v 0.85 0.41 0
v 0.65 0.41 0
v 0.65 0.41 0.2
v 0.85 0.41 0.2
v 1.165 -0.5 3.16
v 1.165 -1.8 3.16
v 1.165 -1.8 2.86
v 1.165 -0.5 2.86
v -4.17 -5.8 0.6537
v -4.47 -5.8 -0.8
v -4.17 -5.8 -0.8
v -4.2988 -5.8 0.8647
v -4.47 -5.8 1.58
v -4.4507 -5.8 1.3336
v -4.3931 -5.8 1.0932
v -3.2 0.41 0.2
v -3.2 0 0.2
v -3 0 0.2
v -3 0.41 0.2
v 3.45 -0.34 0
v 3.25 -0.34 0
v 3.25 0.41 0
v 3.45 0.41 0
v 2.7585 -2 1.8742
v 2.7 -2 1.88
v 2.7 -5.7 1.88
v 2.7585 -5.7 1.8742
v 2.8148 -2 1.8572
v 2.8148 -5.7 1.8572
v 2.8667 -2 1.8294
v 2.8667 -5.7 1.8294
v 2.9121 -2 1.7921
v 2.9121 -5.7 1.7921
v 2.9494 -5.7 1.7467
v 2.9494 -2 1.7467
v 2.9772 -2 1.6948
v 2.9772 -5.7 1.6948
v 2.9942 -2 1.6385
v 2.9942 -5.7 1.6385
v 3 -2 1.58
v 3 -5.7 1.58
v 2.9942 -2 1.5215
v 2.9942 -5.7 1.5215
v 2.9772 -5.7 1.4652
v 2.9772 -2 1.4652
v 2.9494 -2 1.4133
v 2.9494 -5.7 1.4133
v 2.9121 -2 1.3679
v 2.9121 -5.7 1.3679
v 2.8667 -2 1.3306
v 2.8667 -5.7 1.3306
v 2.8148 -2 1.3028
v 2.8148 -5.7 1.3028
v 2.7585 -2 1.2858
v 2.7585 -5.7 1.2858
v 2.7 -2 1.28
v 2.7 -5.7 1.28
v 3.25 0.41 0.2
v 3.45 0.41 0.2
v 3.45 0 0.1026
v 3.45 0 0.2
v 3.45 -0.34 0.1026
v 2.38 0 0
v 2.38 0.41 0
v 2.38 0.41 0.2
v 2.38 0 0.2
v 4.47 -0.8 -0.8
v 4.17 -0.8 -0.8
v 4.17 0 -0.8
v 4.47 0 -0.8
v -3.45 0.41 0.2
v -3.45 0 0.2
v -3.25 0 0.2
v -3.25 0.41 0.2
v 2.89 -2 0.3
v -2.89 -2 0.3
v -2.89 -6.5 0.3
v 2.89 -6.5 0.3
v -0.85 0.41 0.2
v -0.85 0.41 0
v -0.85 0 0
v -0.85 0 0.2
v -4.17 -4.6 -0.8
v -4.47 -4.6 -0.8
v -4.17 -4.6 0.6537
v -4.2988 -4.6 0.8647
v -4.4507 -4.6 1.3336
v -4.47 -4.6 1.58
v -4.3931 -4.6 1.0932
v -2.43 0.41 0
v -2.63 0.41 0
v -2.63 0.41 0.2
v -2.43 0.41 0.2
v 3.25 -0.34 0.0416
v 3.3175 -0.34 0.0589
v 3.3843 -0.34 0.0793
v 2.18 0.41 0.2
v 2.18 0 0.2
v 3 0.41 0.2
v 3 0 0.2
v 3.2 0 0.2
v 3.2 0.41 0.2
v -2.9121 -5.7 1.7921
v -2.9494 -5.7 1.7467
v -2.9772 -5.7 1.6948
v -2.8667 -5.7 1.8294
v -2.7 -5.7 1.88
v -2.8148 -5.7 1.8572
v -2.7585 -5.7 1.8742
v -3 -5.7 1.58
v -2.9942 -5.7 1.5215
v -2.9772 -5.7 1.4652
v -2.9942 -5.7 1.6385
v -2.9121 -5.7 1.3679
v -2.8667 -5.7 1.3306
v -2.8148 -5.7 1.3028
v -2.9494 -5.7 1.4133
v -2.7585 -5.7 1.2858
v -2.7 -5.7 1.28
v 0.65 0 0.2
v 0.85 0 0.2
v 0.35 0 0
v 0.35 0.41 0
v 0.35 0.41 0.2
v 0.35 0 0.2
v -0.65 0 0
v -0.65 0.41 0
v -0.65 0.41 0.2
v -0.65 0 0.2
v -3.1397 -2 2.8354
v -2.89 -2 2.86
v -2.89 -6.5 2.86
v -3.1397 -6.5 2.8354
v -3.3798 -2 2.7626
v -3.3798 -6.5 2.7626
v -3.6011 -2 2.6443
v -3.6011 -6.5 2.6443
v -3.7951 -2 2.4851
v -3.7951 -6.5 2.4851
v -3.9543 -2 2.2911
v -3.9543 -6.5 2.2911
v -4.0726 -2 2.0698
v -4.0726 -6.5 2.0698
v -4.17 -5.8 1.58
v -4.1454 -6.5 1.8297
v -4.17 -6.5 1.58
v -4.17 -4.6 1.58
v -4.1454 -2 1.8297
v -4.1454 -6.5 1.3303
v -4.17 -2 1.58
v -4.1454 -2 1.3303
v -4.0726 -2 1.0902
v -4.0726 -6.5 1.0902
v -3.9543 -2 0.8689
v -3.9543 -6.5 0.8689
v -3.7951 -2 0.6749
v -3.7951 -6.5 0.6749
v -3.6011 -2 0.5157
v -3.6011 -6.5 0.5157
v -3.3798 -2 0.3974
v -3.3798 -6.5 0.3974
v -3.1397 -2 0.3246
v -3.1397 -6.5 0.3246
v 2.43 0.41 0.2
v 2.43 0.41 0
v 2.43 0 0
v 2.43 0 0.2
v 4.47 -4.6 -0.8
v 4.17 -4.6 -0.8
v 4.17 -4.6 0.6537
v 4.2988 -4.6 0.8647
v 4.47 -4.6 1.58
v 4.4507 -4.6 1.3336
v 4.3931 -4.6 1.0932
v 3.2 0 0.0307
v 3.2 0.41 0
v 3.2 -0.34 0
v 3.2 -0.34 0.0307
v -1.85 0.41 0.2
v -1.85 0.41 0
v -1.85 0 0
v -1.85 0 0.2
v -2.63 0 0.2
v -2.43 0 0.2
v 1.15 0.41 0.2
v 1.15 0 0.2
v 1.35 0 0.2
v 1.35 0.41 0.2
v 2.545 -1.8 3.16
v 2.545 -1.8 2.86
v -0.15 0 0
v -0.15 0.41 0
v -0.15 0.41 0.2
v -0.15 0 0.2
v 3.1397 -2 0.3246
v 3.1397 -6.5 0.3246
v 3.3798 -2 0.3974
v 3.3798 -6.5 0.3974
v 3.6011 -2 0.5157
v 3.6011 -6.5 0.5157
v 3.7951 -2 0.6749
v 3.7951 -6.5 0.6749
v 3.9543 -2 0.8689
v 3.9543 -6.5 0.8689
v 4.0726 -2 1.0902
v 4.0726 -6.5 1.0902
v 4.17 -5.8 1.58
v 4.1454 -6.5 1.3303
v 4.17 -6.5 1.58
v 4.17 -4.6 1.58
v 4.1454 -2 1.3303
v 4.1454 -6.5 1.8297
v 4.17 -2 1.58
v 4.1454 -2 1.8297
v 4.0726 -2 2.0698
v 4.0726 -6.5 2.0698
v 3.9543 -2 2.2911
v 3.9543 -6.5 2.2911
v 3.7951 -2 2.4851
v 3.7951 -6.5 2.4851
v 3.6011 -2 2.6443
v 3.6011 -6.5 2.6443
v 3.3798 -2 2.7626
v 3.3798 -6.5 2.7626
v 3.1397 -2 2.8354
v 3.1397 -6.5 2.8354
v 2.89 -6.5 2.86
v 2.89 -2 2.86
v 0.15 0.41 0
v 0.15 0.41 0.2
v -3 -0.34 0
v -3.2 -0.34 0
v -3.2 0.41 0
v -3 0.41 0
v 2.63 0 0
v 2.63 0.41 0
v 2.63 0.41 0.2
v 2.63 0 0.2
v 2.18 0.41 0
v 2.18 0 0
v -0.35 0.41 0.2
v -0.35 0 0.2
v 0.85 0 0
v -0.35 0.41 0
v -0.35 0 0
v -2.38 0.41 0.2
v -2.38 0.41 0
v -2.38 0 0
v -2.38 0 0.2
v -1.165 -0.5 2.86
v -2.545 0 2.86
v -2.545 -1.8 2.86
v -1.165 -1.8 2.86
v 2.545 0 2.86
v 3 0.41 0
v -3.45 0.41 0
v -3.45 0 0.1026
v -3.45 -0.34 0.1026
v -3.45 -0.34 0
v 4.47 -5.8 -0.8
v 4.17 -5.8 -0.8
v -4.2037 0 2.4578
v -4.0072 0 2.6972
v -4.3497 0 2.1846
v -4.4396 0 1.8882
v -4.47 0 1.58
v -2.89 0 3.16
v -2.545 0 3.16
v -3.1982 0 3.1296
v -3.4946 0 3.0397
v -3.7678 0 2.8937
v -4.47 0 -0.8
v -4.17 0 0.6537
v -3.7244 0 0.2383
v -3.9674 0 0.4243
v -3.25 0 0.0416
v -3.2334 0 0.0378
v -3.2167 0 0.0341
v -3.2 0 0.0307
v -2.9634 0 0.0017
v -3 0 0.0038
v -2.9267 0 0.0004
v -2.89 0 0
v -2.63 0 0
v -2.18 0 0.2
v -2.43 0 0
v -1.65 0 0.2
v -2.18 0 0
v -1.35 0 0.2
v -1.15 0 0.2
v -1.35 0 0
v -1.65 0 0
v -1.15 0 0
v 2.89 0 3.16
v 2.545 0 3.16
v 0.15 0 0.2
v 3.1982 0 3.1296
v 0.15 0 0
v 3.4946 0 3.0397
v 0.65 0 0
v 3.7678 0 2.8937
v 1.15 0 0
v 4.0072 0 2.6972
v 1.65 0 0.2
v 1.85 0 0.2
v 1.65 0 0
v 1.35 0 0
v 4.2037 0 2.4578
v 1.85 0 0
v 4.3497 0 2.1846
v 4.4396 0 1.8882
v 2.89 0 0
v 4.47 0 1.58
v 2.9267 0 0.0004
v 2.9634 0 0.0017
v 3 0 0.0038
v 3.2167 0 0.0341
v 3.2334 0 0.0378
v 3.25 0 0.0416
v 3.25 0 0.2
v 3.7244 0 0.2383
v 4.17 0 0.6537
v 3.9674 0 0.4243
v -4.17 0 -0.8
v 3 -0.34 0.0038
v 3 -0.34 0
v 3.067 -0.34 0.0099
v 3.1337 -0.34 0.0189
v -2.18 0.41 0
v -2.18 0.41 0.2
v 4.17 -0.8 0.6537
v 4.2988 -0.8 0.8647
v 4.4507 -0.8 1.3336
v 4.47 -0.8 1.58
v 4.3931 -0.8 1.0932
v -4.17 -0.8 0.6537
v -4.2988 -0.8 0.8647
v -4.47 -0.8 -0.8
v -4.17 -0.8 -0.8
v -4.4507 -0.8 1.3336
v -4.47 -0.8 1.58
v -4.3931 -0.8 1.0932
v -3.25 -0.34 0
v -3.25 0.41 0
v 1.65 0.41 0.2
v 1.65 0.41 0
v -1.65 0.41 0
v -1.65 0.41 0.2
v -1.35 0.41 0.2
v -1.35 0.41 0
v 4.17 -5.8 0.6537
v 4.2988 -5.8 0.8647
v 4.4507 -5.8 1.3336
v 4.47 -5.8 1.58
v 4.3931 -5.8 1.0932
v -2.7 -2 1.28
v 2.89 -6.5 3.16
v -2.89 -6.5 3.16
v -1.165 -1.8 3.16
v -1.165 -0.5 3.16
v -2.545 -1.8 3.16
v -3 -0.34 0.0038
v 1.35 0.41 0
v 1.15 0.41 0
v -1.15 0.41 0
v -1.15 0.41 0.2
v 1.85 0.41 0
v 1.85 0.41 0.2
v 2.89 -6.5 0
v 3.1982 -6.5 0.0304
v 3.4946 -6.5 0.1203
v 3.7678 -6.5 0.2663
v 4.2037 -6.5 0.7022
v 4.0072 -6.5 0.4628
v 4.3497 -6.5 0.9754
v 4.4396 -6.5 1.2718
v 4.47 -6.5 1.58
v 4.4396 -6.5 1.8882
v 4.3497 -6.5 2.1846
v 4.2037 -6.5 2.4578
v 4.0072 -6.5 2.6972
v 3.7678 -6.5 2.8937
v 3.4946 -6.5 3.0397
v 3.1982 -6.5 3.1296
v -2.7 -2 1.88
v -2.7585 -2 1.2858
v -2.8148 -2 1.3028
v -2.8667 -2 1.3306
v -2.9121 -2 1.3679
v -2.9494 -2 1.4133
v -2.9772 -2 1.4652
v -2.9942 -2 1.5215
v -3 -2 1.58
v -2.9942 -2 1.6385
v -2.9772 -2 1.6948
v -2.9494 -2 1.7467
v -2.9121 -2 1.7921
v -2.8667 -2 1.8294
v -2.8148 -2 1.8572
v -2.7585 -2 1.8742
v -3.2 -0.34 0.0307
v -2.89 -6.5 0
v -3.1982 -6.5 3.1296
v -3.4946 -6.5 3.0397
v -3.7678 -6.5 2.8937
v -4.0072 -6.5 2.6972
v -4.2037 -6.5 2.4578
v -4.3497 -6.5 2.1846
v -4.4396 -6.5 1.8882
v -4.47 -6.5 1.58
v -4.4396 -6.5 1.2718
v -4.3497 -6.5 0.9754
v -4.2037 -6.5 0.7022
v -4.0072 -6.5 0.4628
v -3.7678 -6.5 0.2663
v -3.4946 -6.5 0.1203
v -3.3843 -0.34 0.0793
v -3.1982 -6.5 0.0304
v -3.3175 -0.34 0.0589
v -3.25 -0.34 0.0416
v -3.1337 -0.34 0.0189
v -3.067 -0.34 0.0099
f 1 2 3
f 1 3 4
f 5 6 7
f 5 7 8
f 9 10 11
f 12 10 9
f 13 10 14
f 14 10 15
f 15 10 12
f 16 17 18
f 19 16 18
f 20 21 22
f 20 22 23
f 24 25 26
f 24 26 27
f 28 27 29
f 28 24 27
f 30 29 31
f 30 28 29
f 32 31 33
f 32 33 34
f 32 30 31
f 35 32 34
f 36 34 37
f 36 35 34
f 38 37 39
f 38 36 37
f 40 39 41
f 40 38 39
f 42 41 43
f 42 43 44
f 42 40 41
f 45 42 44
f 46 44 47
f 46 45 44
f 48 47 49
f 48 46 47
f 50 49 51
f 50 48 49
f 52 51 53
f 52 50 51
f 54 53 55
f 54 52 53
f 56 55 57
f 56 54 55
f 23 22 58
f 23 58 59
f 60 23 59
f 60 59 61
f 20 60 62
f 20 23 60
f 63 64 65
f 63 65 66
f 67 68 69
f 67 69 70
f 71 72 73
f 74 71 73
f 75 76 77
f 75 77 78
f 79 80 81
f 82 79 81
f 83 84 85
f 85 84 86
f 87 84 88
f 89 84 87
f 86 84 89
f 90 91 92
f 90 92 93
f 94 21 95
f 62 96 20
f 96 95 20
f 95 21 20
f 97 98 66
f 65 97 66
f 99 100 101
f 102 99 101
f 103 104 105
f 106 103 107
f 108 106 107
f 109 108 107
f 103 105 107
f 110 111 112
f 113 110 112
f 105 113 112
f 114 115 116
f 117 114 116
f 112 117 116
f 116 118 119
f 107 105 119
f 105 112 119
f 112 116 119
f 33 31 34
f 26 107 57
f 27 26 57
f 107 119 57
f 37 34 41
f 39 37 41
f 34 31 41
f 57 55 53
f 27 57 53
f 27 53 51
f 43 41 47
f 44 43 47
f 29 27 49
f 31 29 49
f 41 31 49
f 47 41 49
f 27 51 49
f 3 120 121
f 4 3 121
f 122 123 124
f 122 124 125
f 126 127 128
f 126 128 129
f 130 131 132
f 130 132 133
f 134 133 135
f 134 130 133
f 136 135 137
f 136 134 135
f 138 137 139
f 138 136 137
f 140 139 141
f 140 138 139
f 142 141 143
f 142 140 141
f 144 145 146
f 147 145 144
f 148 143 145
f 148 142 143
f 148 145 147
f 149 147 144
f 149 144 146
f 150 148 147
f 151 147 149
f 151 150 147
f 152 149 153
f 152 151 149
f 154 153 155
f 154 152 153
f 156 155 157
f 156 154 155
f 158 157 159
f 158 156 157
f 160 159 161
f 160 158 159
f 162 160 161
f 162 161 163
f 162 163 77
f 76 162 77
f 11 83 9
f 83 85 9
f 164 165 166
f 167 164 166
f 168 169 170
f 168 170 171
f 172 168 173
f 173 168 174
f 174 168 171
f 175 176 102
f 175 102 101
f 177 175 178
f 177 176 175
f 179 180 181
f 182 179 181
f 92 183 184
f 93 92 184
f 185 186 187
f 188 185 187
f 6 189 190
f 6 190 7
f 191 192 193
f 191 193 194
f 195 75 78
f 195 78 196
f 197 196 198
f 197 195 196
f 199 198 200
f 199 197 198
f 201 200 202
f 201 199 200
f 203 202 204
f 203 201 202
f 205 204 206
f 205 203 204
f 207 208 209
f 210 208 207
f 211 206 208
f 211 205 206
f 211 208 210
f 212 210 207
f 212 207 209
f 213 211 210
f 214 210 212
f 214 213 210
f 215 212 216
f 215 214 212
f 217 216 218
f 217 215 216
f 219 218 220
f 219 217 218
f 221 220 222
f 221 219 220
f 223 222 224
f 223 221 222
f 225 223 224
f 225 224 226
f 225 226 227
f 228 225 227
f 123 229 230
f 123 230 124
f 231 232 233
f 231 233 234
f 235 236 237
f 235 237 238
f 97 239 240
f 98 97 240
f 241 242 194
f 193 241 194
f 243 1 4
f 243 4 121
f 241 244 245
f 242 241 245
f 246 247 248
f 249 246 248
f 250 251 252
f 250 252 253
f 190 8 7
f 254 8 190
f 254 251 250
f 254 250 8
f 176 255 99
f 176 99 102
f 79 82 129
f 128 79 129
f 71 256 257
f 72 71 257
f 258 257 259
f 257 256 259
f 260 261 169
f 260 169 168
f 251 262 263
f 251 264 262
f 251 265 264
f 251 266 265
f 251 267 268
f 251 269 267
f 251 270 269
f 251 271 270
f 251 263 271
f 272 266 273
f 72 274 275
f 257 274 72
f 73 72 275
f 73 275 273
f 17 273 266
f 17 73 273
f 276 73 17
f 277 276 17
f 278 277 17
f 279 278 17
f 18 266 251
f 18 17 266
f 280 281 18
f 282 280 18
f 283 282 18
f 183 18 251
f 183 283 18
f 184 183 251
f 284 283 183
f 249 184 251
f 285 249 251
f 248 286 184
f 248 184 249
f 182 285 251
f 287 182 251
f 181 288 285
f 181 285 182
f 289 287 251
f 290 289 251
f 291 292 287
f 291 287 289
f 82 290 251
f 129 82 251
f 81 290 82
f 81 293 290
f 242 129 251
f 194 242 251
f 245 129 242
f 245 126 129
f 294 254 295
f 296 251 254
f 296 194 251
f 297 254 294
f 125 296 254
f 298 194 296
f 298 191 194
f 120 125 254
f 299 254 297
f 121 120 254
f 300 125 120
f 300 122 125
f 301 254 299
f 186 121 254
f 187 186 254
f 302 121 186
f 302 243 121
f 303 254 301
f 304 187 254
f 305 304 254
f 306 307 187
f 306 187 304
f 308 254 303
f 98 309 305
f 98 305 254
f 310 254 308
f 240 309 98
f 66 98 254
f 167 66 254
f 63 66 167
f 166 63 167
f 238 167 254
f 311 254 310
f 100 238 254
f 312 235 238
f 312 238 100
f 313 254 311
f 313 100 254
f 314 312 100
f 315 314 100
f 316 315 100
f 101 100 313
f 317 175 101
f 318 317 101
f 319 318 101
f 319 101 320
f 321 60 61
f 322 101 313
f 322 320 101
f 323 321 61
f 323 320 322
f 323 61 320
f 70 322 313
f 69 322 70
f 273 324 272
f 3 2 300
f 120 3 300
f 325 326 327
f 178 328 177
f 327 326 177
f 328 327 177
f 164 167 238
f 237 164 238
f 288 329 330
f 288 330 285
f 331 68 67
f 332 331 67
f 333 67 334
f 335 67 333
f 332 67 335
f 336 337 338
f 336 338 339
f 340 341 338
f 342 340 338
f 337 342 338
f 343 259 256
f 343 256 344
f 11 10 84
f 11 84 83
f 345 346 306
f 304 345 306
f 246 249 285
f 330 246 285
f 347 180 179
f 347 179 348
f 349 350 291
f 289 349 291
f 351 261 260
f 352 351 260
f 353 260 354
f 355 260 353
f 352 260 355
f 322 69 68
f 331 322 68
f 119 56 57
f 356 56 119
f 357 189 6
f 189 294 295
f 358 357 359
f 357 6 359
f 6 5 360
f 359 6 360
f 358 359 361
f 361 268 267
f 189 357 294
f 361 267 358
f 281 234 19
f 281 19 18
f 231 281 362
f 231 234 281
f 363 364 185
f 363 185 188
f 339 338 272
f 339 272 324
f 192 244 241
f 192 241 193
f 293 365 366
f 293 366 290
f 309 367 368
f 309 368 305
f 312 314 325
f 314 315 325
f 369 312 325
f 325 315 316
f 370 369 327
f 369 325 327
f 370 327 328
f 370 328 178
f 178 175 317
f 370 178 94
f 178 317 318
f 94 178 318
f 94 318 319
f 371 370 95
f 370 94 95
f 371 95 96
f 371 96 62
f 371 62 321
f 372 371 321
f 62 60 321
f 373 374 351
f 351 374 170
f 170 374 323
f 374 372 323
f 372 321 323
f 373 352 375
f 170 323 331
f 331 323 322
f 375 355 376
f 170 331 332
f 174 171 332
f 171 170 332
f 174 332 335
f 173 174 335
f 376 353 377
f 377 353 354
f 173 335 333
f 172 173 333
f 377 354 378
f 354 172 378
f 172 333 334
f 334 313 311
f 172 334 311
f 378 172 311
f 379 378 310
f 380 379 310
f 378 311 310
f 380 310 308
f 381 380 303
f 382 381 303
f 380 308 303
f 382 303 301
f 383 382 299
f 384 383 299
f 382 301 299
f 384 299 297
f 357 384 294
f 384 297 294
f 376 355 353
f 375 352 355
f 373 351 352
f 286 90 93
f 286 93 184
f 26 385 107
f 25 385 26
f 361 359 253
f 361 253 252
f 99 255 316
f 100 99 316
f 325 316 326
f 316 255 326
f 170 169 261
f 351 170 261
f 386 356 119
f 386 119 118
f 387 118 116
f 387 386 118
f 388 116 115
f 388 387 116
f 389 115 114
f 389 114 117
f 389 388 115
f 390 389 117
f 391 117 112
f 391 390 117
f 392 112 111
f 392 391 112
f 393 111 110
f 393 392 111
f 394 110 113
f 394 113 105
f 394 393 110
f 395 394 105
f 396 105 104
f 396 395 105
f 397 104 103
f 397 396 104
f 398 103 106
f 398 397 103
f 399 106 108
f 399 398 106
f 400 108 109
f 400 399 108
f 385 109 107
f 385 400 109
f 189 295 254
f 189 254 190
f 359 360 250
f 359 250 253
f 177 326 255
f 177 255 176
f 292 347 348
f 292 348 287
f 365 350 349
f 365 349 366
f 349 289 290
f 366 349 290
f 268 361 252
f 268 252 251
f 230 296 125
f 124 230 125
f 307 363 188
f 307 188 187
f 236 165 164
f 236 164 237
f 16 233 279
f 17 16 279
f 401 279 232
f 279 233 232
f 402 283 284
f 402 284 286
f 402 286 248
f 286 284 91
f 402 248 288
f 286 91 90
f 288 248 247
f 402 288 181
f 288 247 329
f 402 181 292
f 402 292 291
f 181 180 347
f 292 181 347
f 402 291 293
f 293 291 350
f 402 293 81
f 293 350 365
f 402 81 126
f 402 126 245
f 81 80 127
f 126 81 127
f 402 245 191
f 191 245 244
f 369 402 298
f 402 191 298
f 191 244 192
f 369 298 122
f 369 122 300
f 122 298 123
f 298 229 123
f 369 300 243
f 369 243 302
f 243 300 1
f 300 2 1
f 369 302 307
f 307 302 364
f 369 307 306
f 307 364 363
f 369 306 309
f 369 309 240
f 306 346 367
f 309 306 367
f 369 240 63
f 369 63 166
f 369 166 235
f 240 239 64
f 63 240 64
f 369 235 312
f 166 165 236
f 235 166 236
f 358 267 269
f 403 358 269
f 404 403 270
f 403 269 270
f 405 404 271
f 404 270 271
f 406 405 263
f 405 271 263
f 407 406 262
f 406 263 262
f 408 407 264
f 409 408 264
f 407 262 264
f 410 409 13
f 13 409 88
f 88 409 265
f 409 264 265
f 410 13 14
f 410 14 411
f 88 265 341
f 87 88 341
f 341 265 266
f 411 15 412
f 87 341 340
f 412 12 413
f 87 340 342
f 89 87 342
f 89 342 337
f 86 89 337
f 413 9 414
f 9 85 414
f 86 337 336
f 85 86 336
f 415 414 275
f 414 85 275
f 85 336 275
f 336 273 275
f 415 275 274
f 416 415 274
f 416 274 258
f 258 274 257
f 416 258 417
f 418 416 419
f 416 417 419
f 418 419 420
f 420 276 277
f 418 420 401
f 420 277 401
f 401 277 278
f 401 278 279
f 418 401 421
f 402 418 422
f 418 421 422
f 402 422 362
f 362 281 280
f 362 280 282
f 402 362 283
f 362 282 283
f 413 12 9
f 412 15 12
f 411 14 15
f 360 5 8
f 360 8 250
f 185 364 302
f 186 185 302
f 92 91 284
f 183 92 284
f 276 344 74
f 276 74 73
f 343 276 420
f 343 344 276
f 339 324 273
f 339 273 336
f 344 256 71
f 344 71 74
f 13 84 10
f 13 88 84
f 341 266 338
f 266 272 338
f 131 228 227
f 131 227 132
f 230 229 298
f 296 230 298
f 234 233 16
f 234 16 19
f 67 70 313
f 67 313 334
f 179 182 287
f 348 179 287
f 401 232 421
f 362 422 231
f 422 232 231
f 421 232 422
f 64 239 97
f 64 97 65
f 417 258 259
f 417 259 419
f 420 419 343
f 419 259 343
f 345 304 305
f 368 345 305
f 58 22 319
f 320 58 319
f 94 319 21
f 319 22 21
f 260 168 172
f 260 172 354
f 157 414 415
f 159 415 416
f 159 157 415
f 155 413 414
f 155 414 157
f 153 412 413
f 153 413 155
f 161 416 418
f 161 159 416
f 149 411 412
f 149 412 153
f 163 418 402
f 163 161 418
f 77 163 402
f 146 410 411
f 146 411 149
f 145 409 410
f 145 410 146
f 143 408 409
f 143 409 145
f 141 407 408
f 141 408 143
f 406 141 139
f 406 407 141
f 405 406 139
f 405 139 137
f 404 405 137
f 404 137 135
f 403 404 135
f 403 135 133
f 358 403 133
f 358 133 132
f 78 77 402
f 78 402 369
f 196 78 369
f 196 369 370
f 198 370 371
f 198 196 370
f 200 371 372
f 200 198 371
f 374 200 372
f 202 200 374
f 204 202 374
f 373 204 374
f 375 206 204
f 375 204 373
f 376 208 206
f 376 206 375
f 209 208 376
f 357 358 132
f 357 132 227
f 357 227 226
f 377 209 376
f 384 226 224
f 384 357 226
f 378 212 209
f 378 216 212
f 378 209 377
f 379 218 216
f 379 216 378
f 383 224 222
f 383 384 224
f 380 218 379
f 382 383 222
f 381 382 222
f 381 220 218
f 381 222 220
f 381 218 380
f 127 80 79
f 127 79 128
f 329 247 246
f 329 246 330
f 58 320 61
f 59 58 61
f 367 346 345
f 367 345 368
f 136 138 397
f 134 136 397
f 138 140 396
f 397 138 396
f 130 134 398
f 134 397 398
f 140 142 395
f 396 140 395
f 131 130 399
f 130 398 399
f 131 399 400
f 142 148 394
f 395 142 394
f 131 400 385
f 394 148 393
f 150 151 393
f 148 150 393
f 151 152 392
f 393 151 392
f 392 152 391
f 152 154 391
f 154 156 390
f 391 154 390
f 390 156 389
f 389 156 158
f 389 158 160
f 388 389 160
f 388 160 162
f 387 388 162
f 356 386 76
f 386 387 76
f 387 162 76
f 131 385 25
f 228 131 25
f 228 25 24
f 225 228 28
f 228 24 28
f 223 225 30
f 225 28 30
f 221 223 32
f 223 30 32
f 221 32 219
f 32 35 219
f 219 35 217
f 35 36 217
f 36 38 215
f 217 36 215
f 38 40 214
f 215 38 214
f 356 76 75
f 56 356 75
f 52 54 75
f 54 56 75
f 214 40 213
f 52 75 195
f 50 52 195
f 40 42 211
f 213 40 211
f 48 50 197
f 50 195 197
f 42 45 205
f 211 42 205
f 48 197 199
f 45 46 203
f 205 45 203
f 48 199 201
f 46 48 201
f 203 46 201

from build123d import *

# Parameters (mm, degrees)
PAD_DEPTH         = 6.5
POCKET_DEPTH      = 1
SKETCH002_W       = 0.3
SKETCH002_H       = 1.2
SKETCH002_H_2     = 0.8
PAD001_DEPTH      = 1.58
PAD001_DEPTH_BACK = -0.8
SKETCH004_W       = 0.2
SKETCH004_H       = 0.75
PAD002_DEPTH      = 0.2
PAD003_DEPTH      = 2
PAD004_DEPTH      = 5.7


with BuildPart() as part:
    # Sketch → Pad (new body)
    with BuildSketch(Plane.XZ):
        with BuildLine():
            ThreePointArc((-2.89, 3.16), (-4.47, 1.58), (-2.89, 0))
            Line((-2.89, 0), (2.89, 0))
            ThreePointArc((2.89, 0), (4.47, 1.58), (2.89, 3.16))
            Line((2.89, 3.16), (-2.89, 3.16))
        make_face()
        with BuildLine():
            ThreePointArc((-2.89, 2.86), (-4.17, 1.58), (-2.89, 0.3))
            Line((-2.89, 0.3), (2.89, 0.3))
            ThreePointArc((2.89, 0.3), (4.17, 1.58), (2.89, 2.86))
            Line((2.89, 2.86), (-2.89, 2.86))
        make_face(mode=Mode.SUBTRACT)
    extrude(amount=PAD_DEPTH)

    # Sketch001 (on DatumPlane) → Pocket (cut)
    with BuildSketch(Plane(origin=(0, 0, 3.16), x_dir=(-1, 0, 0), z_dir=(0, 0, 1))):
        Polygon((-2.545, 0), (-2.545, 1.8), (-1.165, 1.8), (-1.165, 0.5), (1.165, 0.5), (1.165, 1.8), (2.545, 1.8), (2.545, 0), align=None)
    extrude(amount=-POCKET_DEPTH, mode=Mode.SUBTRACT)

    # Sketch002 (on DatumPlane) → Pad001 (join, two sides)
    with BuildSketch(Plane(origin=(0, 0, 0), x_dir=(1, 0, 0), z_dir=(0, 0, -1))) as pad001_sk:
        with Locations((-4.32, 5.2)):
            Rectangle(SKETCH002_W, SKETCH002_H)
        with Locations((4.32, 5.2)):
            Rectangle(SKETCH002_W, SKETCH002_H)
        with Locations((-4.32, 0.4)):
            Rectangle(SKETCH002_W, SKETCH002_H_2)
        with Locations((4.32, 0.4)):
            Rectangle(SKETCH002_W, SKETCH002_H_2)
    extrude(amount=-PAD001_DEPTH)
    extrude(pad001_sk.sketch, amount=-PAD001_DEPTH_BACK)

    # Sketch004 → Pad002 (join)
    with BuildSketch(Plane(origin=(0, 0, 0), x_dir=(1, 0, 0), z_dir=(0, 0, -1))):
        with Locations((-3.35, -0.035)):
            Rectangle(SKETCH004_W, SKETCH004_H)
        with Locations((-3.1, -0.035)):
            Rectangle(SKETCH004_W, SKETCH004_H)
        with Locations((-2.53, -0.035)):
            Rectangle(SKETCH004_W, SKETCH004_H)
        with Locations((-2.28, -0.035)):
            Rectangle(SKETCH004_W, SKETCH004_H)
        with Locations((-1.75, -0.035)):
            Rectangle(SKETCH004_W, SKETCH004_H)
        with Locations((-1.25, -0.035)):
            Rectangle(SKETCH004_W, SKETCH004_H)
        with Locations((-0.75, -0.035)):
            Rectangle(SKETCH004_W, SKETCH004_H)
        with Locations((-0.25, -0.035)):
            Rectangle(SKETCH004_W, SKETCH004_H)
        with Locations((3.35, -0.035)):
            Rectangle(SKETCH004_W, SKETCH004_H)
        with Locations((3.1, -0.035)):
            Rectangle(SKETCH004_W, SKETCH004_H)
        with Locations((2.53, -0.035)):
            Rectangle(SKETCH004_W, SKETCH004_H)
        with Locations((2.28, -0.035)):
            Rectangle(SKETCH004_W, SKETCH004_H)
        with Locations((1.75, -0.035)):
            Rectangle(SKETCH004_W, SKETCH004_H)
        with Locations((1.25, -0.035)):
            Rectangle(SKETCH004_W, SKETCH004_H)
        with Locations((0.75, -0.035)):
            Rectangle(SKETCH004_W, SKETCH004_H)
        with Locations((0.25, -0.035)):
            Rectangle(SKETCH004_W, SKETCH004_H)
    extrude(amount=-PAD002_DEPTH)

    # Sketch005 (on DatumPlane) → Pad003 (join)
    with BuildSketch(Plane(origin=(0, 0, 0), x_dir=(1, 0, 0), z_dir=(0, 1, 0))):
        with BuildLine():
            ThreePointArc((-2.95, -0.3), (-4.23, -1.58), (-2.95, -2.86))
            Line((-2.95, -2.86), (2.95, -2.86))
            ThreePointArc((2.95, -2.86), (4.23, -1.58), (2.95, -0.3))
            Line((2.95, -0.3), (-2.95, -0.3))
        make_face()
    extrude(amount=-PAD003_DEPTH)

    # Sketch006 (on DatumPlane) → Pad004 (join)
    with BuildSketch(Plane(origin=(0, 0, 0), x_dir=(1, 0, 0), z_dir=(0, 1, 0))):
        with BuildLine():
            ThreePointArc((-2.7, -1.28), (-3, -1.58), (-2.7, -1.88))
            Line((-2.7, -1.88), (2.7, -1.88))
            ThreePointArc((2.7, -1.88), (3, -1.58), (2.7, -1.28))
            Line((2.7, -1.28), (-2.7, -1.28))
        make_face()
    extrude(amount=-PAD004_DEPTH)


solid = part.part
